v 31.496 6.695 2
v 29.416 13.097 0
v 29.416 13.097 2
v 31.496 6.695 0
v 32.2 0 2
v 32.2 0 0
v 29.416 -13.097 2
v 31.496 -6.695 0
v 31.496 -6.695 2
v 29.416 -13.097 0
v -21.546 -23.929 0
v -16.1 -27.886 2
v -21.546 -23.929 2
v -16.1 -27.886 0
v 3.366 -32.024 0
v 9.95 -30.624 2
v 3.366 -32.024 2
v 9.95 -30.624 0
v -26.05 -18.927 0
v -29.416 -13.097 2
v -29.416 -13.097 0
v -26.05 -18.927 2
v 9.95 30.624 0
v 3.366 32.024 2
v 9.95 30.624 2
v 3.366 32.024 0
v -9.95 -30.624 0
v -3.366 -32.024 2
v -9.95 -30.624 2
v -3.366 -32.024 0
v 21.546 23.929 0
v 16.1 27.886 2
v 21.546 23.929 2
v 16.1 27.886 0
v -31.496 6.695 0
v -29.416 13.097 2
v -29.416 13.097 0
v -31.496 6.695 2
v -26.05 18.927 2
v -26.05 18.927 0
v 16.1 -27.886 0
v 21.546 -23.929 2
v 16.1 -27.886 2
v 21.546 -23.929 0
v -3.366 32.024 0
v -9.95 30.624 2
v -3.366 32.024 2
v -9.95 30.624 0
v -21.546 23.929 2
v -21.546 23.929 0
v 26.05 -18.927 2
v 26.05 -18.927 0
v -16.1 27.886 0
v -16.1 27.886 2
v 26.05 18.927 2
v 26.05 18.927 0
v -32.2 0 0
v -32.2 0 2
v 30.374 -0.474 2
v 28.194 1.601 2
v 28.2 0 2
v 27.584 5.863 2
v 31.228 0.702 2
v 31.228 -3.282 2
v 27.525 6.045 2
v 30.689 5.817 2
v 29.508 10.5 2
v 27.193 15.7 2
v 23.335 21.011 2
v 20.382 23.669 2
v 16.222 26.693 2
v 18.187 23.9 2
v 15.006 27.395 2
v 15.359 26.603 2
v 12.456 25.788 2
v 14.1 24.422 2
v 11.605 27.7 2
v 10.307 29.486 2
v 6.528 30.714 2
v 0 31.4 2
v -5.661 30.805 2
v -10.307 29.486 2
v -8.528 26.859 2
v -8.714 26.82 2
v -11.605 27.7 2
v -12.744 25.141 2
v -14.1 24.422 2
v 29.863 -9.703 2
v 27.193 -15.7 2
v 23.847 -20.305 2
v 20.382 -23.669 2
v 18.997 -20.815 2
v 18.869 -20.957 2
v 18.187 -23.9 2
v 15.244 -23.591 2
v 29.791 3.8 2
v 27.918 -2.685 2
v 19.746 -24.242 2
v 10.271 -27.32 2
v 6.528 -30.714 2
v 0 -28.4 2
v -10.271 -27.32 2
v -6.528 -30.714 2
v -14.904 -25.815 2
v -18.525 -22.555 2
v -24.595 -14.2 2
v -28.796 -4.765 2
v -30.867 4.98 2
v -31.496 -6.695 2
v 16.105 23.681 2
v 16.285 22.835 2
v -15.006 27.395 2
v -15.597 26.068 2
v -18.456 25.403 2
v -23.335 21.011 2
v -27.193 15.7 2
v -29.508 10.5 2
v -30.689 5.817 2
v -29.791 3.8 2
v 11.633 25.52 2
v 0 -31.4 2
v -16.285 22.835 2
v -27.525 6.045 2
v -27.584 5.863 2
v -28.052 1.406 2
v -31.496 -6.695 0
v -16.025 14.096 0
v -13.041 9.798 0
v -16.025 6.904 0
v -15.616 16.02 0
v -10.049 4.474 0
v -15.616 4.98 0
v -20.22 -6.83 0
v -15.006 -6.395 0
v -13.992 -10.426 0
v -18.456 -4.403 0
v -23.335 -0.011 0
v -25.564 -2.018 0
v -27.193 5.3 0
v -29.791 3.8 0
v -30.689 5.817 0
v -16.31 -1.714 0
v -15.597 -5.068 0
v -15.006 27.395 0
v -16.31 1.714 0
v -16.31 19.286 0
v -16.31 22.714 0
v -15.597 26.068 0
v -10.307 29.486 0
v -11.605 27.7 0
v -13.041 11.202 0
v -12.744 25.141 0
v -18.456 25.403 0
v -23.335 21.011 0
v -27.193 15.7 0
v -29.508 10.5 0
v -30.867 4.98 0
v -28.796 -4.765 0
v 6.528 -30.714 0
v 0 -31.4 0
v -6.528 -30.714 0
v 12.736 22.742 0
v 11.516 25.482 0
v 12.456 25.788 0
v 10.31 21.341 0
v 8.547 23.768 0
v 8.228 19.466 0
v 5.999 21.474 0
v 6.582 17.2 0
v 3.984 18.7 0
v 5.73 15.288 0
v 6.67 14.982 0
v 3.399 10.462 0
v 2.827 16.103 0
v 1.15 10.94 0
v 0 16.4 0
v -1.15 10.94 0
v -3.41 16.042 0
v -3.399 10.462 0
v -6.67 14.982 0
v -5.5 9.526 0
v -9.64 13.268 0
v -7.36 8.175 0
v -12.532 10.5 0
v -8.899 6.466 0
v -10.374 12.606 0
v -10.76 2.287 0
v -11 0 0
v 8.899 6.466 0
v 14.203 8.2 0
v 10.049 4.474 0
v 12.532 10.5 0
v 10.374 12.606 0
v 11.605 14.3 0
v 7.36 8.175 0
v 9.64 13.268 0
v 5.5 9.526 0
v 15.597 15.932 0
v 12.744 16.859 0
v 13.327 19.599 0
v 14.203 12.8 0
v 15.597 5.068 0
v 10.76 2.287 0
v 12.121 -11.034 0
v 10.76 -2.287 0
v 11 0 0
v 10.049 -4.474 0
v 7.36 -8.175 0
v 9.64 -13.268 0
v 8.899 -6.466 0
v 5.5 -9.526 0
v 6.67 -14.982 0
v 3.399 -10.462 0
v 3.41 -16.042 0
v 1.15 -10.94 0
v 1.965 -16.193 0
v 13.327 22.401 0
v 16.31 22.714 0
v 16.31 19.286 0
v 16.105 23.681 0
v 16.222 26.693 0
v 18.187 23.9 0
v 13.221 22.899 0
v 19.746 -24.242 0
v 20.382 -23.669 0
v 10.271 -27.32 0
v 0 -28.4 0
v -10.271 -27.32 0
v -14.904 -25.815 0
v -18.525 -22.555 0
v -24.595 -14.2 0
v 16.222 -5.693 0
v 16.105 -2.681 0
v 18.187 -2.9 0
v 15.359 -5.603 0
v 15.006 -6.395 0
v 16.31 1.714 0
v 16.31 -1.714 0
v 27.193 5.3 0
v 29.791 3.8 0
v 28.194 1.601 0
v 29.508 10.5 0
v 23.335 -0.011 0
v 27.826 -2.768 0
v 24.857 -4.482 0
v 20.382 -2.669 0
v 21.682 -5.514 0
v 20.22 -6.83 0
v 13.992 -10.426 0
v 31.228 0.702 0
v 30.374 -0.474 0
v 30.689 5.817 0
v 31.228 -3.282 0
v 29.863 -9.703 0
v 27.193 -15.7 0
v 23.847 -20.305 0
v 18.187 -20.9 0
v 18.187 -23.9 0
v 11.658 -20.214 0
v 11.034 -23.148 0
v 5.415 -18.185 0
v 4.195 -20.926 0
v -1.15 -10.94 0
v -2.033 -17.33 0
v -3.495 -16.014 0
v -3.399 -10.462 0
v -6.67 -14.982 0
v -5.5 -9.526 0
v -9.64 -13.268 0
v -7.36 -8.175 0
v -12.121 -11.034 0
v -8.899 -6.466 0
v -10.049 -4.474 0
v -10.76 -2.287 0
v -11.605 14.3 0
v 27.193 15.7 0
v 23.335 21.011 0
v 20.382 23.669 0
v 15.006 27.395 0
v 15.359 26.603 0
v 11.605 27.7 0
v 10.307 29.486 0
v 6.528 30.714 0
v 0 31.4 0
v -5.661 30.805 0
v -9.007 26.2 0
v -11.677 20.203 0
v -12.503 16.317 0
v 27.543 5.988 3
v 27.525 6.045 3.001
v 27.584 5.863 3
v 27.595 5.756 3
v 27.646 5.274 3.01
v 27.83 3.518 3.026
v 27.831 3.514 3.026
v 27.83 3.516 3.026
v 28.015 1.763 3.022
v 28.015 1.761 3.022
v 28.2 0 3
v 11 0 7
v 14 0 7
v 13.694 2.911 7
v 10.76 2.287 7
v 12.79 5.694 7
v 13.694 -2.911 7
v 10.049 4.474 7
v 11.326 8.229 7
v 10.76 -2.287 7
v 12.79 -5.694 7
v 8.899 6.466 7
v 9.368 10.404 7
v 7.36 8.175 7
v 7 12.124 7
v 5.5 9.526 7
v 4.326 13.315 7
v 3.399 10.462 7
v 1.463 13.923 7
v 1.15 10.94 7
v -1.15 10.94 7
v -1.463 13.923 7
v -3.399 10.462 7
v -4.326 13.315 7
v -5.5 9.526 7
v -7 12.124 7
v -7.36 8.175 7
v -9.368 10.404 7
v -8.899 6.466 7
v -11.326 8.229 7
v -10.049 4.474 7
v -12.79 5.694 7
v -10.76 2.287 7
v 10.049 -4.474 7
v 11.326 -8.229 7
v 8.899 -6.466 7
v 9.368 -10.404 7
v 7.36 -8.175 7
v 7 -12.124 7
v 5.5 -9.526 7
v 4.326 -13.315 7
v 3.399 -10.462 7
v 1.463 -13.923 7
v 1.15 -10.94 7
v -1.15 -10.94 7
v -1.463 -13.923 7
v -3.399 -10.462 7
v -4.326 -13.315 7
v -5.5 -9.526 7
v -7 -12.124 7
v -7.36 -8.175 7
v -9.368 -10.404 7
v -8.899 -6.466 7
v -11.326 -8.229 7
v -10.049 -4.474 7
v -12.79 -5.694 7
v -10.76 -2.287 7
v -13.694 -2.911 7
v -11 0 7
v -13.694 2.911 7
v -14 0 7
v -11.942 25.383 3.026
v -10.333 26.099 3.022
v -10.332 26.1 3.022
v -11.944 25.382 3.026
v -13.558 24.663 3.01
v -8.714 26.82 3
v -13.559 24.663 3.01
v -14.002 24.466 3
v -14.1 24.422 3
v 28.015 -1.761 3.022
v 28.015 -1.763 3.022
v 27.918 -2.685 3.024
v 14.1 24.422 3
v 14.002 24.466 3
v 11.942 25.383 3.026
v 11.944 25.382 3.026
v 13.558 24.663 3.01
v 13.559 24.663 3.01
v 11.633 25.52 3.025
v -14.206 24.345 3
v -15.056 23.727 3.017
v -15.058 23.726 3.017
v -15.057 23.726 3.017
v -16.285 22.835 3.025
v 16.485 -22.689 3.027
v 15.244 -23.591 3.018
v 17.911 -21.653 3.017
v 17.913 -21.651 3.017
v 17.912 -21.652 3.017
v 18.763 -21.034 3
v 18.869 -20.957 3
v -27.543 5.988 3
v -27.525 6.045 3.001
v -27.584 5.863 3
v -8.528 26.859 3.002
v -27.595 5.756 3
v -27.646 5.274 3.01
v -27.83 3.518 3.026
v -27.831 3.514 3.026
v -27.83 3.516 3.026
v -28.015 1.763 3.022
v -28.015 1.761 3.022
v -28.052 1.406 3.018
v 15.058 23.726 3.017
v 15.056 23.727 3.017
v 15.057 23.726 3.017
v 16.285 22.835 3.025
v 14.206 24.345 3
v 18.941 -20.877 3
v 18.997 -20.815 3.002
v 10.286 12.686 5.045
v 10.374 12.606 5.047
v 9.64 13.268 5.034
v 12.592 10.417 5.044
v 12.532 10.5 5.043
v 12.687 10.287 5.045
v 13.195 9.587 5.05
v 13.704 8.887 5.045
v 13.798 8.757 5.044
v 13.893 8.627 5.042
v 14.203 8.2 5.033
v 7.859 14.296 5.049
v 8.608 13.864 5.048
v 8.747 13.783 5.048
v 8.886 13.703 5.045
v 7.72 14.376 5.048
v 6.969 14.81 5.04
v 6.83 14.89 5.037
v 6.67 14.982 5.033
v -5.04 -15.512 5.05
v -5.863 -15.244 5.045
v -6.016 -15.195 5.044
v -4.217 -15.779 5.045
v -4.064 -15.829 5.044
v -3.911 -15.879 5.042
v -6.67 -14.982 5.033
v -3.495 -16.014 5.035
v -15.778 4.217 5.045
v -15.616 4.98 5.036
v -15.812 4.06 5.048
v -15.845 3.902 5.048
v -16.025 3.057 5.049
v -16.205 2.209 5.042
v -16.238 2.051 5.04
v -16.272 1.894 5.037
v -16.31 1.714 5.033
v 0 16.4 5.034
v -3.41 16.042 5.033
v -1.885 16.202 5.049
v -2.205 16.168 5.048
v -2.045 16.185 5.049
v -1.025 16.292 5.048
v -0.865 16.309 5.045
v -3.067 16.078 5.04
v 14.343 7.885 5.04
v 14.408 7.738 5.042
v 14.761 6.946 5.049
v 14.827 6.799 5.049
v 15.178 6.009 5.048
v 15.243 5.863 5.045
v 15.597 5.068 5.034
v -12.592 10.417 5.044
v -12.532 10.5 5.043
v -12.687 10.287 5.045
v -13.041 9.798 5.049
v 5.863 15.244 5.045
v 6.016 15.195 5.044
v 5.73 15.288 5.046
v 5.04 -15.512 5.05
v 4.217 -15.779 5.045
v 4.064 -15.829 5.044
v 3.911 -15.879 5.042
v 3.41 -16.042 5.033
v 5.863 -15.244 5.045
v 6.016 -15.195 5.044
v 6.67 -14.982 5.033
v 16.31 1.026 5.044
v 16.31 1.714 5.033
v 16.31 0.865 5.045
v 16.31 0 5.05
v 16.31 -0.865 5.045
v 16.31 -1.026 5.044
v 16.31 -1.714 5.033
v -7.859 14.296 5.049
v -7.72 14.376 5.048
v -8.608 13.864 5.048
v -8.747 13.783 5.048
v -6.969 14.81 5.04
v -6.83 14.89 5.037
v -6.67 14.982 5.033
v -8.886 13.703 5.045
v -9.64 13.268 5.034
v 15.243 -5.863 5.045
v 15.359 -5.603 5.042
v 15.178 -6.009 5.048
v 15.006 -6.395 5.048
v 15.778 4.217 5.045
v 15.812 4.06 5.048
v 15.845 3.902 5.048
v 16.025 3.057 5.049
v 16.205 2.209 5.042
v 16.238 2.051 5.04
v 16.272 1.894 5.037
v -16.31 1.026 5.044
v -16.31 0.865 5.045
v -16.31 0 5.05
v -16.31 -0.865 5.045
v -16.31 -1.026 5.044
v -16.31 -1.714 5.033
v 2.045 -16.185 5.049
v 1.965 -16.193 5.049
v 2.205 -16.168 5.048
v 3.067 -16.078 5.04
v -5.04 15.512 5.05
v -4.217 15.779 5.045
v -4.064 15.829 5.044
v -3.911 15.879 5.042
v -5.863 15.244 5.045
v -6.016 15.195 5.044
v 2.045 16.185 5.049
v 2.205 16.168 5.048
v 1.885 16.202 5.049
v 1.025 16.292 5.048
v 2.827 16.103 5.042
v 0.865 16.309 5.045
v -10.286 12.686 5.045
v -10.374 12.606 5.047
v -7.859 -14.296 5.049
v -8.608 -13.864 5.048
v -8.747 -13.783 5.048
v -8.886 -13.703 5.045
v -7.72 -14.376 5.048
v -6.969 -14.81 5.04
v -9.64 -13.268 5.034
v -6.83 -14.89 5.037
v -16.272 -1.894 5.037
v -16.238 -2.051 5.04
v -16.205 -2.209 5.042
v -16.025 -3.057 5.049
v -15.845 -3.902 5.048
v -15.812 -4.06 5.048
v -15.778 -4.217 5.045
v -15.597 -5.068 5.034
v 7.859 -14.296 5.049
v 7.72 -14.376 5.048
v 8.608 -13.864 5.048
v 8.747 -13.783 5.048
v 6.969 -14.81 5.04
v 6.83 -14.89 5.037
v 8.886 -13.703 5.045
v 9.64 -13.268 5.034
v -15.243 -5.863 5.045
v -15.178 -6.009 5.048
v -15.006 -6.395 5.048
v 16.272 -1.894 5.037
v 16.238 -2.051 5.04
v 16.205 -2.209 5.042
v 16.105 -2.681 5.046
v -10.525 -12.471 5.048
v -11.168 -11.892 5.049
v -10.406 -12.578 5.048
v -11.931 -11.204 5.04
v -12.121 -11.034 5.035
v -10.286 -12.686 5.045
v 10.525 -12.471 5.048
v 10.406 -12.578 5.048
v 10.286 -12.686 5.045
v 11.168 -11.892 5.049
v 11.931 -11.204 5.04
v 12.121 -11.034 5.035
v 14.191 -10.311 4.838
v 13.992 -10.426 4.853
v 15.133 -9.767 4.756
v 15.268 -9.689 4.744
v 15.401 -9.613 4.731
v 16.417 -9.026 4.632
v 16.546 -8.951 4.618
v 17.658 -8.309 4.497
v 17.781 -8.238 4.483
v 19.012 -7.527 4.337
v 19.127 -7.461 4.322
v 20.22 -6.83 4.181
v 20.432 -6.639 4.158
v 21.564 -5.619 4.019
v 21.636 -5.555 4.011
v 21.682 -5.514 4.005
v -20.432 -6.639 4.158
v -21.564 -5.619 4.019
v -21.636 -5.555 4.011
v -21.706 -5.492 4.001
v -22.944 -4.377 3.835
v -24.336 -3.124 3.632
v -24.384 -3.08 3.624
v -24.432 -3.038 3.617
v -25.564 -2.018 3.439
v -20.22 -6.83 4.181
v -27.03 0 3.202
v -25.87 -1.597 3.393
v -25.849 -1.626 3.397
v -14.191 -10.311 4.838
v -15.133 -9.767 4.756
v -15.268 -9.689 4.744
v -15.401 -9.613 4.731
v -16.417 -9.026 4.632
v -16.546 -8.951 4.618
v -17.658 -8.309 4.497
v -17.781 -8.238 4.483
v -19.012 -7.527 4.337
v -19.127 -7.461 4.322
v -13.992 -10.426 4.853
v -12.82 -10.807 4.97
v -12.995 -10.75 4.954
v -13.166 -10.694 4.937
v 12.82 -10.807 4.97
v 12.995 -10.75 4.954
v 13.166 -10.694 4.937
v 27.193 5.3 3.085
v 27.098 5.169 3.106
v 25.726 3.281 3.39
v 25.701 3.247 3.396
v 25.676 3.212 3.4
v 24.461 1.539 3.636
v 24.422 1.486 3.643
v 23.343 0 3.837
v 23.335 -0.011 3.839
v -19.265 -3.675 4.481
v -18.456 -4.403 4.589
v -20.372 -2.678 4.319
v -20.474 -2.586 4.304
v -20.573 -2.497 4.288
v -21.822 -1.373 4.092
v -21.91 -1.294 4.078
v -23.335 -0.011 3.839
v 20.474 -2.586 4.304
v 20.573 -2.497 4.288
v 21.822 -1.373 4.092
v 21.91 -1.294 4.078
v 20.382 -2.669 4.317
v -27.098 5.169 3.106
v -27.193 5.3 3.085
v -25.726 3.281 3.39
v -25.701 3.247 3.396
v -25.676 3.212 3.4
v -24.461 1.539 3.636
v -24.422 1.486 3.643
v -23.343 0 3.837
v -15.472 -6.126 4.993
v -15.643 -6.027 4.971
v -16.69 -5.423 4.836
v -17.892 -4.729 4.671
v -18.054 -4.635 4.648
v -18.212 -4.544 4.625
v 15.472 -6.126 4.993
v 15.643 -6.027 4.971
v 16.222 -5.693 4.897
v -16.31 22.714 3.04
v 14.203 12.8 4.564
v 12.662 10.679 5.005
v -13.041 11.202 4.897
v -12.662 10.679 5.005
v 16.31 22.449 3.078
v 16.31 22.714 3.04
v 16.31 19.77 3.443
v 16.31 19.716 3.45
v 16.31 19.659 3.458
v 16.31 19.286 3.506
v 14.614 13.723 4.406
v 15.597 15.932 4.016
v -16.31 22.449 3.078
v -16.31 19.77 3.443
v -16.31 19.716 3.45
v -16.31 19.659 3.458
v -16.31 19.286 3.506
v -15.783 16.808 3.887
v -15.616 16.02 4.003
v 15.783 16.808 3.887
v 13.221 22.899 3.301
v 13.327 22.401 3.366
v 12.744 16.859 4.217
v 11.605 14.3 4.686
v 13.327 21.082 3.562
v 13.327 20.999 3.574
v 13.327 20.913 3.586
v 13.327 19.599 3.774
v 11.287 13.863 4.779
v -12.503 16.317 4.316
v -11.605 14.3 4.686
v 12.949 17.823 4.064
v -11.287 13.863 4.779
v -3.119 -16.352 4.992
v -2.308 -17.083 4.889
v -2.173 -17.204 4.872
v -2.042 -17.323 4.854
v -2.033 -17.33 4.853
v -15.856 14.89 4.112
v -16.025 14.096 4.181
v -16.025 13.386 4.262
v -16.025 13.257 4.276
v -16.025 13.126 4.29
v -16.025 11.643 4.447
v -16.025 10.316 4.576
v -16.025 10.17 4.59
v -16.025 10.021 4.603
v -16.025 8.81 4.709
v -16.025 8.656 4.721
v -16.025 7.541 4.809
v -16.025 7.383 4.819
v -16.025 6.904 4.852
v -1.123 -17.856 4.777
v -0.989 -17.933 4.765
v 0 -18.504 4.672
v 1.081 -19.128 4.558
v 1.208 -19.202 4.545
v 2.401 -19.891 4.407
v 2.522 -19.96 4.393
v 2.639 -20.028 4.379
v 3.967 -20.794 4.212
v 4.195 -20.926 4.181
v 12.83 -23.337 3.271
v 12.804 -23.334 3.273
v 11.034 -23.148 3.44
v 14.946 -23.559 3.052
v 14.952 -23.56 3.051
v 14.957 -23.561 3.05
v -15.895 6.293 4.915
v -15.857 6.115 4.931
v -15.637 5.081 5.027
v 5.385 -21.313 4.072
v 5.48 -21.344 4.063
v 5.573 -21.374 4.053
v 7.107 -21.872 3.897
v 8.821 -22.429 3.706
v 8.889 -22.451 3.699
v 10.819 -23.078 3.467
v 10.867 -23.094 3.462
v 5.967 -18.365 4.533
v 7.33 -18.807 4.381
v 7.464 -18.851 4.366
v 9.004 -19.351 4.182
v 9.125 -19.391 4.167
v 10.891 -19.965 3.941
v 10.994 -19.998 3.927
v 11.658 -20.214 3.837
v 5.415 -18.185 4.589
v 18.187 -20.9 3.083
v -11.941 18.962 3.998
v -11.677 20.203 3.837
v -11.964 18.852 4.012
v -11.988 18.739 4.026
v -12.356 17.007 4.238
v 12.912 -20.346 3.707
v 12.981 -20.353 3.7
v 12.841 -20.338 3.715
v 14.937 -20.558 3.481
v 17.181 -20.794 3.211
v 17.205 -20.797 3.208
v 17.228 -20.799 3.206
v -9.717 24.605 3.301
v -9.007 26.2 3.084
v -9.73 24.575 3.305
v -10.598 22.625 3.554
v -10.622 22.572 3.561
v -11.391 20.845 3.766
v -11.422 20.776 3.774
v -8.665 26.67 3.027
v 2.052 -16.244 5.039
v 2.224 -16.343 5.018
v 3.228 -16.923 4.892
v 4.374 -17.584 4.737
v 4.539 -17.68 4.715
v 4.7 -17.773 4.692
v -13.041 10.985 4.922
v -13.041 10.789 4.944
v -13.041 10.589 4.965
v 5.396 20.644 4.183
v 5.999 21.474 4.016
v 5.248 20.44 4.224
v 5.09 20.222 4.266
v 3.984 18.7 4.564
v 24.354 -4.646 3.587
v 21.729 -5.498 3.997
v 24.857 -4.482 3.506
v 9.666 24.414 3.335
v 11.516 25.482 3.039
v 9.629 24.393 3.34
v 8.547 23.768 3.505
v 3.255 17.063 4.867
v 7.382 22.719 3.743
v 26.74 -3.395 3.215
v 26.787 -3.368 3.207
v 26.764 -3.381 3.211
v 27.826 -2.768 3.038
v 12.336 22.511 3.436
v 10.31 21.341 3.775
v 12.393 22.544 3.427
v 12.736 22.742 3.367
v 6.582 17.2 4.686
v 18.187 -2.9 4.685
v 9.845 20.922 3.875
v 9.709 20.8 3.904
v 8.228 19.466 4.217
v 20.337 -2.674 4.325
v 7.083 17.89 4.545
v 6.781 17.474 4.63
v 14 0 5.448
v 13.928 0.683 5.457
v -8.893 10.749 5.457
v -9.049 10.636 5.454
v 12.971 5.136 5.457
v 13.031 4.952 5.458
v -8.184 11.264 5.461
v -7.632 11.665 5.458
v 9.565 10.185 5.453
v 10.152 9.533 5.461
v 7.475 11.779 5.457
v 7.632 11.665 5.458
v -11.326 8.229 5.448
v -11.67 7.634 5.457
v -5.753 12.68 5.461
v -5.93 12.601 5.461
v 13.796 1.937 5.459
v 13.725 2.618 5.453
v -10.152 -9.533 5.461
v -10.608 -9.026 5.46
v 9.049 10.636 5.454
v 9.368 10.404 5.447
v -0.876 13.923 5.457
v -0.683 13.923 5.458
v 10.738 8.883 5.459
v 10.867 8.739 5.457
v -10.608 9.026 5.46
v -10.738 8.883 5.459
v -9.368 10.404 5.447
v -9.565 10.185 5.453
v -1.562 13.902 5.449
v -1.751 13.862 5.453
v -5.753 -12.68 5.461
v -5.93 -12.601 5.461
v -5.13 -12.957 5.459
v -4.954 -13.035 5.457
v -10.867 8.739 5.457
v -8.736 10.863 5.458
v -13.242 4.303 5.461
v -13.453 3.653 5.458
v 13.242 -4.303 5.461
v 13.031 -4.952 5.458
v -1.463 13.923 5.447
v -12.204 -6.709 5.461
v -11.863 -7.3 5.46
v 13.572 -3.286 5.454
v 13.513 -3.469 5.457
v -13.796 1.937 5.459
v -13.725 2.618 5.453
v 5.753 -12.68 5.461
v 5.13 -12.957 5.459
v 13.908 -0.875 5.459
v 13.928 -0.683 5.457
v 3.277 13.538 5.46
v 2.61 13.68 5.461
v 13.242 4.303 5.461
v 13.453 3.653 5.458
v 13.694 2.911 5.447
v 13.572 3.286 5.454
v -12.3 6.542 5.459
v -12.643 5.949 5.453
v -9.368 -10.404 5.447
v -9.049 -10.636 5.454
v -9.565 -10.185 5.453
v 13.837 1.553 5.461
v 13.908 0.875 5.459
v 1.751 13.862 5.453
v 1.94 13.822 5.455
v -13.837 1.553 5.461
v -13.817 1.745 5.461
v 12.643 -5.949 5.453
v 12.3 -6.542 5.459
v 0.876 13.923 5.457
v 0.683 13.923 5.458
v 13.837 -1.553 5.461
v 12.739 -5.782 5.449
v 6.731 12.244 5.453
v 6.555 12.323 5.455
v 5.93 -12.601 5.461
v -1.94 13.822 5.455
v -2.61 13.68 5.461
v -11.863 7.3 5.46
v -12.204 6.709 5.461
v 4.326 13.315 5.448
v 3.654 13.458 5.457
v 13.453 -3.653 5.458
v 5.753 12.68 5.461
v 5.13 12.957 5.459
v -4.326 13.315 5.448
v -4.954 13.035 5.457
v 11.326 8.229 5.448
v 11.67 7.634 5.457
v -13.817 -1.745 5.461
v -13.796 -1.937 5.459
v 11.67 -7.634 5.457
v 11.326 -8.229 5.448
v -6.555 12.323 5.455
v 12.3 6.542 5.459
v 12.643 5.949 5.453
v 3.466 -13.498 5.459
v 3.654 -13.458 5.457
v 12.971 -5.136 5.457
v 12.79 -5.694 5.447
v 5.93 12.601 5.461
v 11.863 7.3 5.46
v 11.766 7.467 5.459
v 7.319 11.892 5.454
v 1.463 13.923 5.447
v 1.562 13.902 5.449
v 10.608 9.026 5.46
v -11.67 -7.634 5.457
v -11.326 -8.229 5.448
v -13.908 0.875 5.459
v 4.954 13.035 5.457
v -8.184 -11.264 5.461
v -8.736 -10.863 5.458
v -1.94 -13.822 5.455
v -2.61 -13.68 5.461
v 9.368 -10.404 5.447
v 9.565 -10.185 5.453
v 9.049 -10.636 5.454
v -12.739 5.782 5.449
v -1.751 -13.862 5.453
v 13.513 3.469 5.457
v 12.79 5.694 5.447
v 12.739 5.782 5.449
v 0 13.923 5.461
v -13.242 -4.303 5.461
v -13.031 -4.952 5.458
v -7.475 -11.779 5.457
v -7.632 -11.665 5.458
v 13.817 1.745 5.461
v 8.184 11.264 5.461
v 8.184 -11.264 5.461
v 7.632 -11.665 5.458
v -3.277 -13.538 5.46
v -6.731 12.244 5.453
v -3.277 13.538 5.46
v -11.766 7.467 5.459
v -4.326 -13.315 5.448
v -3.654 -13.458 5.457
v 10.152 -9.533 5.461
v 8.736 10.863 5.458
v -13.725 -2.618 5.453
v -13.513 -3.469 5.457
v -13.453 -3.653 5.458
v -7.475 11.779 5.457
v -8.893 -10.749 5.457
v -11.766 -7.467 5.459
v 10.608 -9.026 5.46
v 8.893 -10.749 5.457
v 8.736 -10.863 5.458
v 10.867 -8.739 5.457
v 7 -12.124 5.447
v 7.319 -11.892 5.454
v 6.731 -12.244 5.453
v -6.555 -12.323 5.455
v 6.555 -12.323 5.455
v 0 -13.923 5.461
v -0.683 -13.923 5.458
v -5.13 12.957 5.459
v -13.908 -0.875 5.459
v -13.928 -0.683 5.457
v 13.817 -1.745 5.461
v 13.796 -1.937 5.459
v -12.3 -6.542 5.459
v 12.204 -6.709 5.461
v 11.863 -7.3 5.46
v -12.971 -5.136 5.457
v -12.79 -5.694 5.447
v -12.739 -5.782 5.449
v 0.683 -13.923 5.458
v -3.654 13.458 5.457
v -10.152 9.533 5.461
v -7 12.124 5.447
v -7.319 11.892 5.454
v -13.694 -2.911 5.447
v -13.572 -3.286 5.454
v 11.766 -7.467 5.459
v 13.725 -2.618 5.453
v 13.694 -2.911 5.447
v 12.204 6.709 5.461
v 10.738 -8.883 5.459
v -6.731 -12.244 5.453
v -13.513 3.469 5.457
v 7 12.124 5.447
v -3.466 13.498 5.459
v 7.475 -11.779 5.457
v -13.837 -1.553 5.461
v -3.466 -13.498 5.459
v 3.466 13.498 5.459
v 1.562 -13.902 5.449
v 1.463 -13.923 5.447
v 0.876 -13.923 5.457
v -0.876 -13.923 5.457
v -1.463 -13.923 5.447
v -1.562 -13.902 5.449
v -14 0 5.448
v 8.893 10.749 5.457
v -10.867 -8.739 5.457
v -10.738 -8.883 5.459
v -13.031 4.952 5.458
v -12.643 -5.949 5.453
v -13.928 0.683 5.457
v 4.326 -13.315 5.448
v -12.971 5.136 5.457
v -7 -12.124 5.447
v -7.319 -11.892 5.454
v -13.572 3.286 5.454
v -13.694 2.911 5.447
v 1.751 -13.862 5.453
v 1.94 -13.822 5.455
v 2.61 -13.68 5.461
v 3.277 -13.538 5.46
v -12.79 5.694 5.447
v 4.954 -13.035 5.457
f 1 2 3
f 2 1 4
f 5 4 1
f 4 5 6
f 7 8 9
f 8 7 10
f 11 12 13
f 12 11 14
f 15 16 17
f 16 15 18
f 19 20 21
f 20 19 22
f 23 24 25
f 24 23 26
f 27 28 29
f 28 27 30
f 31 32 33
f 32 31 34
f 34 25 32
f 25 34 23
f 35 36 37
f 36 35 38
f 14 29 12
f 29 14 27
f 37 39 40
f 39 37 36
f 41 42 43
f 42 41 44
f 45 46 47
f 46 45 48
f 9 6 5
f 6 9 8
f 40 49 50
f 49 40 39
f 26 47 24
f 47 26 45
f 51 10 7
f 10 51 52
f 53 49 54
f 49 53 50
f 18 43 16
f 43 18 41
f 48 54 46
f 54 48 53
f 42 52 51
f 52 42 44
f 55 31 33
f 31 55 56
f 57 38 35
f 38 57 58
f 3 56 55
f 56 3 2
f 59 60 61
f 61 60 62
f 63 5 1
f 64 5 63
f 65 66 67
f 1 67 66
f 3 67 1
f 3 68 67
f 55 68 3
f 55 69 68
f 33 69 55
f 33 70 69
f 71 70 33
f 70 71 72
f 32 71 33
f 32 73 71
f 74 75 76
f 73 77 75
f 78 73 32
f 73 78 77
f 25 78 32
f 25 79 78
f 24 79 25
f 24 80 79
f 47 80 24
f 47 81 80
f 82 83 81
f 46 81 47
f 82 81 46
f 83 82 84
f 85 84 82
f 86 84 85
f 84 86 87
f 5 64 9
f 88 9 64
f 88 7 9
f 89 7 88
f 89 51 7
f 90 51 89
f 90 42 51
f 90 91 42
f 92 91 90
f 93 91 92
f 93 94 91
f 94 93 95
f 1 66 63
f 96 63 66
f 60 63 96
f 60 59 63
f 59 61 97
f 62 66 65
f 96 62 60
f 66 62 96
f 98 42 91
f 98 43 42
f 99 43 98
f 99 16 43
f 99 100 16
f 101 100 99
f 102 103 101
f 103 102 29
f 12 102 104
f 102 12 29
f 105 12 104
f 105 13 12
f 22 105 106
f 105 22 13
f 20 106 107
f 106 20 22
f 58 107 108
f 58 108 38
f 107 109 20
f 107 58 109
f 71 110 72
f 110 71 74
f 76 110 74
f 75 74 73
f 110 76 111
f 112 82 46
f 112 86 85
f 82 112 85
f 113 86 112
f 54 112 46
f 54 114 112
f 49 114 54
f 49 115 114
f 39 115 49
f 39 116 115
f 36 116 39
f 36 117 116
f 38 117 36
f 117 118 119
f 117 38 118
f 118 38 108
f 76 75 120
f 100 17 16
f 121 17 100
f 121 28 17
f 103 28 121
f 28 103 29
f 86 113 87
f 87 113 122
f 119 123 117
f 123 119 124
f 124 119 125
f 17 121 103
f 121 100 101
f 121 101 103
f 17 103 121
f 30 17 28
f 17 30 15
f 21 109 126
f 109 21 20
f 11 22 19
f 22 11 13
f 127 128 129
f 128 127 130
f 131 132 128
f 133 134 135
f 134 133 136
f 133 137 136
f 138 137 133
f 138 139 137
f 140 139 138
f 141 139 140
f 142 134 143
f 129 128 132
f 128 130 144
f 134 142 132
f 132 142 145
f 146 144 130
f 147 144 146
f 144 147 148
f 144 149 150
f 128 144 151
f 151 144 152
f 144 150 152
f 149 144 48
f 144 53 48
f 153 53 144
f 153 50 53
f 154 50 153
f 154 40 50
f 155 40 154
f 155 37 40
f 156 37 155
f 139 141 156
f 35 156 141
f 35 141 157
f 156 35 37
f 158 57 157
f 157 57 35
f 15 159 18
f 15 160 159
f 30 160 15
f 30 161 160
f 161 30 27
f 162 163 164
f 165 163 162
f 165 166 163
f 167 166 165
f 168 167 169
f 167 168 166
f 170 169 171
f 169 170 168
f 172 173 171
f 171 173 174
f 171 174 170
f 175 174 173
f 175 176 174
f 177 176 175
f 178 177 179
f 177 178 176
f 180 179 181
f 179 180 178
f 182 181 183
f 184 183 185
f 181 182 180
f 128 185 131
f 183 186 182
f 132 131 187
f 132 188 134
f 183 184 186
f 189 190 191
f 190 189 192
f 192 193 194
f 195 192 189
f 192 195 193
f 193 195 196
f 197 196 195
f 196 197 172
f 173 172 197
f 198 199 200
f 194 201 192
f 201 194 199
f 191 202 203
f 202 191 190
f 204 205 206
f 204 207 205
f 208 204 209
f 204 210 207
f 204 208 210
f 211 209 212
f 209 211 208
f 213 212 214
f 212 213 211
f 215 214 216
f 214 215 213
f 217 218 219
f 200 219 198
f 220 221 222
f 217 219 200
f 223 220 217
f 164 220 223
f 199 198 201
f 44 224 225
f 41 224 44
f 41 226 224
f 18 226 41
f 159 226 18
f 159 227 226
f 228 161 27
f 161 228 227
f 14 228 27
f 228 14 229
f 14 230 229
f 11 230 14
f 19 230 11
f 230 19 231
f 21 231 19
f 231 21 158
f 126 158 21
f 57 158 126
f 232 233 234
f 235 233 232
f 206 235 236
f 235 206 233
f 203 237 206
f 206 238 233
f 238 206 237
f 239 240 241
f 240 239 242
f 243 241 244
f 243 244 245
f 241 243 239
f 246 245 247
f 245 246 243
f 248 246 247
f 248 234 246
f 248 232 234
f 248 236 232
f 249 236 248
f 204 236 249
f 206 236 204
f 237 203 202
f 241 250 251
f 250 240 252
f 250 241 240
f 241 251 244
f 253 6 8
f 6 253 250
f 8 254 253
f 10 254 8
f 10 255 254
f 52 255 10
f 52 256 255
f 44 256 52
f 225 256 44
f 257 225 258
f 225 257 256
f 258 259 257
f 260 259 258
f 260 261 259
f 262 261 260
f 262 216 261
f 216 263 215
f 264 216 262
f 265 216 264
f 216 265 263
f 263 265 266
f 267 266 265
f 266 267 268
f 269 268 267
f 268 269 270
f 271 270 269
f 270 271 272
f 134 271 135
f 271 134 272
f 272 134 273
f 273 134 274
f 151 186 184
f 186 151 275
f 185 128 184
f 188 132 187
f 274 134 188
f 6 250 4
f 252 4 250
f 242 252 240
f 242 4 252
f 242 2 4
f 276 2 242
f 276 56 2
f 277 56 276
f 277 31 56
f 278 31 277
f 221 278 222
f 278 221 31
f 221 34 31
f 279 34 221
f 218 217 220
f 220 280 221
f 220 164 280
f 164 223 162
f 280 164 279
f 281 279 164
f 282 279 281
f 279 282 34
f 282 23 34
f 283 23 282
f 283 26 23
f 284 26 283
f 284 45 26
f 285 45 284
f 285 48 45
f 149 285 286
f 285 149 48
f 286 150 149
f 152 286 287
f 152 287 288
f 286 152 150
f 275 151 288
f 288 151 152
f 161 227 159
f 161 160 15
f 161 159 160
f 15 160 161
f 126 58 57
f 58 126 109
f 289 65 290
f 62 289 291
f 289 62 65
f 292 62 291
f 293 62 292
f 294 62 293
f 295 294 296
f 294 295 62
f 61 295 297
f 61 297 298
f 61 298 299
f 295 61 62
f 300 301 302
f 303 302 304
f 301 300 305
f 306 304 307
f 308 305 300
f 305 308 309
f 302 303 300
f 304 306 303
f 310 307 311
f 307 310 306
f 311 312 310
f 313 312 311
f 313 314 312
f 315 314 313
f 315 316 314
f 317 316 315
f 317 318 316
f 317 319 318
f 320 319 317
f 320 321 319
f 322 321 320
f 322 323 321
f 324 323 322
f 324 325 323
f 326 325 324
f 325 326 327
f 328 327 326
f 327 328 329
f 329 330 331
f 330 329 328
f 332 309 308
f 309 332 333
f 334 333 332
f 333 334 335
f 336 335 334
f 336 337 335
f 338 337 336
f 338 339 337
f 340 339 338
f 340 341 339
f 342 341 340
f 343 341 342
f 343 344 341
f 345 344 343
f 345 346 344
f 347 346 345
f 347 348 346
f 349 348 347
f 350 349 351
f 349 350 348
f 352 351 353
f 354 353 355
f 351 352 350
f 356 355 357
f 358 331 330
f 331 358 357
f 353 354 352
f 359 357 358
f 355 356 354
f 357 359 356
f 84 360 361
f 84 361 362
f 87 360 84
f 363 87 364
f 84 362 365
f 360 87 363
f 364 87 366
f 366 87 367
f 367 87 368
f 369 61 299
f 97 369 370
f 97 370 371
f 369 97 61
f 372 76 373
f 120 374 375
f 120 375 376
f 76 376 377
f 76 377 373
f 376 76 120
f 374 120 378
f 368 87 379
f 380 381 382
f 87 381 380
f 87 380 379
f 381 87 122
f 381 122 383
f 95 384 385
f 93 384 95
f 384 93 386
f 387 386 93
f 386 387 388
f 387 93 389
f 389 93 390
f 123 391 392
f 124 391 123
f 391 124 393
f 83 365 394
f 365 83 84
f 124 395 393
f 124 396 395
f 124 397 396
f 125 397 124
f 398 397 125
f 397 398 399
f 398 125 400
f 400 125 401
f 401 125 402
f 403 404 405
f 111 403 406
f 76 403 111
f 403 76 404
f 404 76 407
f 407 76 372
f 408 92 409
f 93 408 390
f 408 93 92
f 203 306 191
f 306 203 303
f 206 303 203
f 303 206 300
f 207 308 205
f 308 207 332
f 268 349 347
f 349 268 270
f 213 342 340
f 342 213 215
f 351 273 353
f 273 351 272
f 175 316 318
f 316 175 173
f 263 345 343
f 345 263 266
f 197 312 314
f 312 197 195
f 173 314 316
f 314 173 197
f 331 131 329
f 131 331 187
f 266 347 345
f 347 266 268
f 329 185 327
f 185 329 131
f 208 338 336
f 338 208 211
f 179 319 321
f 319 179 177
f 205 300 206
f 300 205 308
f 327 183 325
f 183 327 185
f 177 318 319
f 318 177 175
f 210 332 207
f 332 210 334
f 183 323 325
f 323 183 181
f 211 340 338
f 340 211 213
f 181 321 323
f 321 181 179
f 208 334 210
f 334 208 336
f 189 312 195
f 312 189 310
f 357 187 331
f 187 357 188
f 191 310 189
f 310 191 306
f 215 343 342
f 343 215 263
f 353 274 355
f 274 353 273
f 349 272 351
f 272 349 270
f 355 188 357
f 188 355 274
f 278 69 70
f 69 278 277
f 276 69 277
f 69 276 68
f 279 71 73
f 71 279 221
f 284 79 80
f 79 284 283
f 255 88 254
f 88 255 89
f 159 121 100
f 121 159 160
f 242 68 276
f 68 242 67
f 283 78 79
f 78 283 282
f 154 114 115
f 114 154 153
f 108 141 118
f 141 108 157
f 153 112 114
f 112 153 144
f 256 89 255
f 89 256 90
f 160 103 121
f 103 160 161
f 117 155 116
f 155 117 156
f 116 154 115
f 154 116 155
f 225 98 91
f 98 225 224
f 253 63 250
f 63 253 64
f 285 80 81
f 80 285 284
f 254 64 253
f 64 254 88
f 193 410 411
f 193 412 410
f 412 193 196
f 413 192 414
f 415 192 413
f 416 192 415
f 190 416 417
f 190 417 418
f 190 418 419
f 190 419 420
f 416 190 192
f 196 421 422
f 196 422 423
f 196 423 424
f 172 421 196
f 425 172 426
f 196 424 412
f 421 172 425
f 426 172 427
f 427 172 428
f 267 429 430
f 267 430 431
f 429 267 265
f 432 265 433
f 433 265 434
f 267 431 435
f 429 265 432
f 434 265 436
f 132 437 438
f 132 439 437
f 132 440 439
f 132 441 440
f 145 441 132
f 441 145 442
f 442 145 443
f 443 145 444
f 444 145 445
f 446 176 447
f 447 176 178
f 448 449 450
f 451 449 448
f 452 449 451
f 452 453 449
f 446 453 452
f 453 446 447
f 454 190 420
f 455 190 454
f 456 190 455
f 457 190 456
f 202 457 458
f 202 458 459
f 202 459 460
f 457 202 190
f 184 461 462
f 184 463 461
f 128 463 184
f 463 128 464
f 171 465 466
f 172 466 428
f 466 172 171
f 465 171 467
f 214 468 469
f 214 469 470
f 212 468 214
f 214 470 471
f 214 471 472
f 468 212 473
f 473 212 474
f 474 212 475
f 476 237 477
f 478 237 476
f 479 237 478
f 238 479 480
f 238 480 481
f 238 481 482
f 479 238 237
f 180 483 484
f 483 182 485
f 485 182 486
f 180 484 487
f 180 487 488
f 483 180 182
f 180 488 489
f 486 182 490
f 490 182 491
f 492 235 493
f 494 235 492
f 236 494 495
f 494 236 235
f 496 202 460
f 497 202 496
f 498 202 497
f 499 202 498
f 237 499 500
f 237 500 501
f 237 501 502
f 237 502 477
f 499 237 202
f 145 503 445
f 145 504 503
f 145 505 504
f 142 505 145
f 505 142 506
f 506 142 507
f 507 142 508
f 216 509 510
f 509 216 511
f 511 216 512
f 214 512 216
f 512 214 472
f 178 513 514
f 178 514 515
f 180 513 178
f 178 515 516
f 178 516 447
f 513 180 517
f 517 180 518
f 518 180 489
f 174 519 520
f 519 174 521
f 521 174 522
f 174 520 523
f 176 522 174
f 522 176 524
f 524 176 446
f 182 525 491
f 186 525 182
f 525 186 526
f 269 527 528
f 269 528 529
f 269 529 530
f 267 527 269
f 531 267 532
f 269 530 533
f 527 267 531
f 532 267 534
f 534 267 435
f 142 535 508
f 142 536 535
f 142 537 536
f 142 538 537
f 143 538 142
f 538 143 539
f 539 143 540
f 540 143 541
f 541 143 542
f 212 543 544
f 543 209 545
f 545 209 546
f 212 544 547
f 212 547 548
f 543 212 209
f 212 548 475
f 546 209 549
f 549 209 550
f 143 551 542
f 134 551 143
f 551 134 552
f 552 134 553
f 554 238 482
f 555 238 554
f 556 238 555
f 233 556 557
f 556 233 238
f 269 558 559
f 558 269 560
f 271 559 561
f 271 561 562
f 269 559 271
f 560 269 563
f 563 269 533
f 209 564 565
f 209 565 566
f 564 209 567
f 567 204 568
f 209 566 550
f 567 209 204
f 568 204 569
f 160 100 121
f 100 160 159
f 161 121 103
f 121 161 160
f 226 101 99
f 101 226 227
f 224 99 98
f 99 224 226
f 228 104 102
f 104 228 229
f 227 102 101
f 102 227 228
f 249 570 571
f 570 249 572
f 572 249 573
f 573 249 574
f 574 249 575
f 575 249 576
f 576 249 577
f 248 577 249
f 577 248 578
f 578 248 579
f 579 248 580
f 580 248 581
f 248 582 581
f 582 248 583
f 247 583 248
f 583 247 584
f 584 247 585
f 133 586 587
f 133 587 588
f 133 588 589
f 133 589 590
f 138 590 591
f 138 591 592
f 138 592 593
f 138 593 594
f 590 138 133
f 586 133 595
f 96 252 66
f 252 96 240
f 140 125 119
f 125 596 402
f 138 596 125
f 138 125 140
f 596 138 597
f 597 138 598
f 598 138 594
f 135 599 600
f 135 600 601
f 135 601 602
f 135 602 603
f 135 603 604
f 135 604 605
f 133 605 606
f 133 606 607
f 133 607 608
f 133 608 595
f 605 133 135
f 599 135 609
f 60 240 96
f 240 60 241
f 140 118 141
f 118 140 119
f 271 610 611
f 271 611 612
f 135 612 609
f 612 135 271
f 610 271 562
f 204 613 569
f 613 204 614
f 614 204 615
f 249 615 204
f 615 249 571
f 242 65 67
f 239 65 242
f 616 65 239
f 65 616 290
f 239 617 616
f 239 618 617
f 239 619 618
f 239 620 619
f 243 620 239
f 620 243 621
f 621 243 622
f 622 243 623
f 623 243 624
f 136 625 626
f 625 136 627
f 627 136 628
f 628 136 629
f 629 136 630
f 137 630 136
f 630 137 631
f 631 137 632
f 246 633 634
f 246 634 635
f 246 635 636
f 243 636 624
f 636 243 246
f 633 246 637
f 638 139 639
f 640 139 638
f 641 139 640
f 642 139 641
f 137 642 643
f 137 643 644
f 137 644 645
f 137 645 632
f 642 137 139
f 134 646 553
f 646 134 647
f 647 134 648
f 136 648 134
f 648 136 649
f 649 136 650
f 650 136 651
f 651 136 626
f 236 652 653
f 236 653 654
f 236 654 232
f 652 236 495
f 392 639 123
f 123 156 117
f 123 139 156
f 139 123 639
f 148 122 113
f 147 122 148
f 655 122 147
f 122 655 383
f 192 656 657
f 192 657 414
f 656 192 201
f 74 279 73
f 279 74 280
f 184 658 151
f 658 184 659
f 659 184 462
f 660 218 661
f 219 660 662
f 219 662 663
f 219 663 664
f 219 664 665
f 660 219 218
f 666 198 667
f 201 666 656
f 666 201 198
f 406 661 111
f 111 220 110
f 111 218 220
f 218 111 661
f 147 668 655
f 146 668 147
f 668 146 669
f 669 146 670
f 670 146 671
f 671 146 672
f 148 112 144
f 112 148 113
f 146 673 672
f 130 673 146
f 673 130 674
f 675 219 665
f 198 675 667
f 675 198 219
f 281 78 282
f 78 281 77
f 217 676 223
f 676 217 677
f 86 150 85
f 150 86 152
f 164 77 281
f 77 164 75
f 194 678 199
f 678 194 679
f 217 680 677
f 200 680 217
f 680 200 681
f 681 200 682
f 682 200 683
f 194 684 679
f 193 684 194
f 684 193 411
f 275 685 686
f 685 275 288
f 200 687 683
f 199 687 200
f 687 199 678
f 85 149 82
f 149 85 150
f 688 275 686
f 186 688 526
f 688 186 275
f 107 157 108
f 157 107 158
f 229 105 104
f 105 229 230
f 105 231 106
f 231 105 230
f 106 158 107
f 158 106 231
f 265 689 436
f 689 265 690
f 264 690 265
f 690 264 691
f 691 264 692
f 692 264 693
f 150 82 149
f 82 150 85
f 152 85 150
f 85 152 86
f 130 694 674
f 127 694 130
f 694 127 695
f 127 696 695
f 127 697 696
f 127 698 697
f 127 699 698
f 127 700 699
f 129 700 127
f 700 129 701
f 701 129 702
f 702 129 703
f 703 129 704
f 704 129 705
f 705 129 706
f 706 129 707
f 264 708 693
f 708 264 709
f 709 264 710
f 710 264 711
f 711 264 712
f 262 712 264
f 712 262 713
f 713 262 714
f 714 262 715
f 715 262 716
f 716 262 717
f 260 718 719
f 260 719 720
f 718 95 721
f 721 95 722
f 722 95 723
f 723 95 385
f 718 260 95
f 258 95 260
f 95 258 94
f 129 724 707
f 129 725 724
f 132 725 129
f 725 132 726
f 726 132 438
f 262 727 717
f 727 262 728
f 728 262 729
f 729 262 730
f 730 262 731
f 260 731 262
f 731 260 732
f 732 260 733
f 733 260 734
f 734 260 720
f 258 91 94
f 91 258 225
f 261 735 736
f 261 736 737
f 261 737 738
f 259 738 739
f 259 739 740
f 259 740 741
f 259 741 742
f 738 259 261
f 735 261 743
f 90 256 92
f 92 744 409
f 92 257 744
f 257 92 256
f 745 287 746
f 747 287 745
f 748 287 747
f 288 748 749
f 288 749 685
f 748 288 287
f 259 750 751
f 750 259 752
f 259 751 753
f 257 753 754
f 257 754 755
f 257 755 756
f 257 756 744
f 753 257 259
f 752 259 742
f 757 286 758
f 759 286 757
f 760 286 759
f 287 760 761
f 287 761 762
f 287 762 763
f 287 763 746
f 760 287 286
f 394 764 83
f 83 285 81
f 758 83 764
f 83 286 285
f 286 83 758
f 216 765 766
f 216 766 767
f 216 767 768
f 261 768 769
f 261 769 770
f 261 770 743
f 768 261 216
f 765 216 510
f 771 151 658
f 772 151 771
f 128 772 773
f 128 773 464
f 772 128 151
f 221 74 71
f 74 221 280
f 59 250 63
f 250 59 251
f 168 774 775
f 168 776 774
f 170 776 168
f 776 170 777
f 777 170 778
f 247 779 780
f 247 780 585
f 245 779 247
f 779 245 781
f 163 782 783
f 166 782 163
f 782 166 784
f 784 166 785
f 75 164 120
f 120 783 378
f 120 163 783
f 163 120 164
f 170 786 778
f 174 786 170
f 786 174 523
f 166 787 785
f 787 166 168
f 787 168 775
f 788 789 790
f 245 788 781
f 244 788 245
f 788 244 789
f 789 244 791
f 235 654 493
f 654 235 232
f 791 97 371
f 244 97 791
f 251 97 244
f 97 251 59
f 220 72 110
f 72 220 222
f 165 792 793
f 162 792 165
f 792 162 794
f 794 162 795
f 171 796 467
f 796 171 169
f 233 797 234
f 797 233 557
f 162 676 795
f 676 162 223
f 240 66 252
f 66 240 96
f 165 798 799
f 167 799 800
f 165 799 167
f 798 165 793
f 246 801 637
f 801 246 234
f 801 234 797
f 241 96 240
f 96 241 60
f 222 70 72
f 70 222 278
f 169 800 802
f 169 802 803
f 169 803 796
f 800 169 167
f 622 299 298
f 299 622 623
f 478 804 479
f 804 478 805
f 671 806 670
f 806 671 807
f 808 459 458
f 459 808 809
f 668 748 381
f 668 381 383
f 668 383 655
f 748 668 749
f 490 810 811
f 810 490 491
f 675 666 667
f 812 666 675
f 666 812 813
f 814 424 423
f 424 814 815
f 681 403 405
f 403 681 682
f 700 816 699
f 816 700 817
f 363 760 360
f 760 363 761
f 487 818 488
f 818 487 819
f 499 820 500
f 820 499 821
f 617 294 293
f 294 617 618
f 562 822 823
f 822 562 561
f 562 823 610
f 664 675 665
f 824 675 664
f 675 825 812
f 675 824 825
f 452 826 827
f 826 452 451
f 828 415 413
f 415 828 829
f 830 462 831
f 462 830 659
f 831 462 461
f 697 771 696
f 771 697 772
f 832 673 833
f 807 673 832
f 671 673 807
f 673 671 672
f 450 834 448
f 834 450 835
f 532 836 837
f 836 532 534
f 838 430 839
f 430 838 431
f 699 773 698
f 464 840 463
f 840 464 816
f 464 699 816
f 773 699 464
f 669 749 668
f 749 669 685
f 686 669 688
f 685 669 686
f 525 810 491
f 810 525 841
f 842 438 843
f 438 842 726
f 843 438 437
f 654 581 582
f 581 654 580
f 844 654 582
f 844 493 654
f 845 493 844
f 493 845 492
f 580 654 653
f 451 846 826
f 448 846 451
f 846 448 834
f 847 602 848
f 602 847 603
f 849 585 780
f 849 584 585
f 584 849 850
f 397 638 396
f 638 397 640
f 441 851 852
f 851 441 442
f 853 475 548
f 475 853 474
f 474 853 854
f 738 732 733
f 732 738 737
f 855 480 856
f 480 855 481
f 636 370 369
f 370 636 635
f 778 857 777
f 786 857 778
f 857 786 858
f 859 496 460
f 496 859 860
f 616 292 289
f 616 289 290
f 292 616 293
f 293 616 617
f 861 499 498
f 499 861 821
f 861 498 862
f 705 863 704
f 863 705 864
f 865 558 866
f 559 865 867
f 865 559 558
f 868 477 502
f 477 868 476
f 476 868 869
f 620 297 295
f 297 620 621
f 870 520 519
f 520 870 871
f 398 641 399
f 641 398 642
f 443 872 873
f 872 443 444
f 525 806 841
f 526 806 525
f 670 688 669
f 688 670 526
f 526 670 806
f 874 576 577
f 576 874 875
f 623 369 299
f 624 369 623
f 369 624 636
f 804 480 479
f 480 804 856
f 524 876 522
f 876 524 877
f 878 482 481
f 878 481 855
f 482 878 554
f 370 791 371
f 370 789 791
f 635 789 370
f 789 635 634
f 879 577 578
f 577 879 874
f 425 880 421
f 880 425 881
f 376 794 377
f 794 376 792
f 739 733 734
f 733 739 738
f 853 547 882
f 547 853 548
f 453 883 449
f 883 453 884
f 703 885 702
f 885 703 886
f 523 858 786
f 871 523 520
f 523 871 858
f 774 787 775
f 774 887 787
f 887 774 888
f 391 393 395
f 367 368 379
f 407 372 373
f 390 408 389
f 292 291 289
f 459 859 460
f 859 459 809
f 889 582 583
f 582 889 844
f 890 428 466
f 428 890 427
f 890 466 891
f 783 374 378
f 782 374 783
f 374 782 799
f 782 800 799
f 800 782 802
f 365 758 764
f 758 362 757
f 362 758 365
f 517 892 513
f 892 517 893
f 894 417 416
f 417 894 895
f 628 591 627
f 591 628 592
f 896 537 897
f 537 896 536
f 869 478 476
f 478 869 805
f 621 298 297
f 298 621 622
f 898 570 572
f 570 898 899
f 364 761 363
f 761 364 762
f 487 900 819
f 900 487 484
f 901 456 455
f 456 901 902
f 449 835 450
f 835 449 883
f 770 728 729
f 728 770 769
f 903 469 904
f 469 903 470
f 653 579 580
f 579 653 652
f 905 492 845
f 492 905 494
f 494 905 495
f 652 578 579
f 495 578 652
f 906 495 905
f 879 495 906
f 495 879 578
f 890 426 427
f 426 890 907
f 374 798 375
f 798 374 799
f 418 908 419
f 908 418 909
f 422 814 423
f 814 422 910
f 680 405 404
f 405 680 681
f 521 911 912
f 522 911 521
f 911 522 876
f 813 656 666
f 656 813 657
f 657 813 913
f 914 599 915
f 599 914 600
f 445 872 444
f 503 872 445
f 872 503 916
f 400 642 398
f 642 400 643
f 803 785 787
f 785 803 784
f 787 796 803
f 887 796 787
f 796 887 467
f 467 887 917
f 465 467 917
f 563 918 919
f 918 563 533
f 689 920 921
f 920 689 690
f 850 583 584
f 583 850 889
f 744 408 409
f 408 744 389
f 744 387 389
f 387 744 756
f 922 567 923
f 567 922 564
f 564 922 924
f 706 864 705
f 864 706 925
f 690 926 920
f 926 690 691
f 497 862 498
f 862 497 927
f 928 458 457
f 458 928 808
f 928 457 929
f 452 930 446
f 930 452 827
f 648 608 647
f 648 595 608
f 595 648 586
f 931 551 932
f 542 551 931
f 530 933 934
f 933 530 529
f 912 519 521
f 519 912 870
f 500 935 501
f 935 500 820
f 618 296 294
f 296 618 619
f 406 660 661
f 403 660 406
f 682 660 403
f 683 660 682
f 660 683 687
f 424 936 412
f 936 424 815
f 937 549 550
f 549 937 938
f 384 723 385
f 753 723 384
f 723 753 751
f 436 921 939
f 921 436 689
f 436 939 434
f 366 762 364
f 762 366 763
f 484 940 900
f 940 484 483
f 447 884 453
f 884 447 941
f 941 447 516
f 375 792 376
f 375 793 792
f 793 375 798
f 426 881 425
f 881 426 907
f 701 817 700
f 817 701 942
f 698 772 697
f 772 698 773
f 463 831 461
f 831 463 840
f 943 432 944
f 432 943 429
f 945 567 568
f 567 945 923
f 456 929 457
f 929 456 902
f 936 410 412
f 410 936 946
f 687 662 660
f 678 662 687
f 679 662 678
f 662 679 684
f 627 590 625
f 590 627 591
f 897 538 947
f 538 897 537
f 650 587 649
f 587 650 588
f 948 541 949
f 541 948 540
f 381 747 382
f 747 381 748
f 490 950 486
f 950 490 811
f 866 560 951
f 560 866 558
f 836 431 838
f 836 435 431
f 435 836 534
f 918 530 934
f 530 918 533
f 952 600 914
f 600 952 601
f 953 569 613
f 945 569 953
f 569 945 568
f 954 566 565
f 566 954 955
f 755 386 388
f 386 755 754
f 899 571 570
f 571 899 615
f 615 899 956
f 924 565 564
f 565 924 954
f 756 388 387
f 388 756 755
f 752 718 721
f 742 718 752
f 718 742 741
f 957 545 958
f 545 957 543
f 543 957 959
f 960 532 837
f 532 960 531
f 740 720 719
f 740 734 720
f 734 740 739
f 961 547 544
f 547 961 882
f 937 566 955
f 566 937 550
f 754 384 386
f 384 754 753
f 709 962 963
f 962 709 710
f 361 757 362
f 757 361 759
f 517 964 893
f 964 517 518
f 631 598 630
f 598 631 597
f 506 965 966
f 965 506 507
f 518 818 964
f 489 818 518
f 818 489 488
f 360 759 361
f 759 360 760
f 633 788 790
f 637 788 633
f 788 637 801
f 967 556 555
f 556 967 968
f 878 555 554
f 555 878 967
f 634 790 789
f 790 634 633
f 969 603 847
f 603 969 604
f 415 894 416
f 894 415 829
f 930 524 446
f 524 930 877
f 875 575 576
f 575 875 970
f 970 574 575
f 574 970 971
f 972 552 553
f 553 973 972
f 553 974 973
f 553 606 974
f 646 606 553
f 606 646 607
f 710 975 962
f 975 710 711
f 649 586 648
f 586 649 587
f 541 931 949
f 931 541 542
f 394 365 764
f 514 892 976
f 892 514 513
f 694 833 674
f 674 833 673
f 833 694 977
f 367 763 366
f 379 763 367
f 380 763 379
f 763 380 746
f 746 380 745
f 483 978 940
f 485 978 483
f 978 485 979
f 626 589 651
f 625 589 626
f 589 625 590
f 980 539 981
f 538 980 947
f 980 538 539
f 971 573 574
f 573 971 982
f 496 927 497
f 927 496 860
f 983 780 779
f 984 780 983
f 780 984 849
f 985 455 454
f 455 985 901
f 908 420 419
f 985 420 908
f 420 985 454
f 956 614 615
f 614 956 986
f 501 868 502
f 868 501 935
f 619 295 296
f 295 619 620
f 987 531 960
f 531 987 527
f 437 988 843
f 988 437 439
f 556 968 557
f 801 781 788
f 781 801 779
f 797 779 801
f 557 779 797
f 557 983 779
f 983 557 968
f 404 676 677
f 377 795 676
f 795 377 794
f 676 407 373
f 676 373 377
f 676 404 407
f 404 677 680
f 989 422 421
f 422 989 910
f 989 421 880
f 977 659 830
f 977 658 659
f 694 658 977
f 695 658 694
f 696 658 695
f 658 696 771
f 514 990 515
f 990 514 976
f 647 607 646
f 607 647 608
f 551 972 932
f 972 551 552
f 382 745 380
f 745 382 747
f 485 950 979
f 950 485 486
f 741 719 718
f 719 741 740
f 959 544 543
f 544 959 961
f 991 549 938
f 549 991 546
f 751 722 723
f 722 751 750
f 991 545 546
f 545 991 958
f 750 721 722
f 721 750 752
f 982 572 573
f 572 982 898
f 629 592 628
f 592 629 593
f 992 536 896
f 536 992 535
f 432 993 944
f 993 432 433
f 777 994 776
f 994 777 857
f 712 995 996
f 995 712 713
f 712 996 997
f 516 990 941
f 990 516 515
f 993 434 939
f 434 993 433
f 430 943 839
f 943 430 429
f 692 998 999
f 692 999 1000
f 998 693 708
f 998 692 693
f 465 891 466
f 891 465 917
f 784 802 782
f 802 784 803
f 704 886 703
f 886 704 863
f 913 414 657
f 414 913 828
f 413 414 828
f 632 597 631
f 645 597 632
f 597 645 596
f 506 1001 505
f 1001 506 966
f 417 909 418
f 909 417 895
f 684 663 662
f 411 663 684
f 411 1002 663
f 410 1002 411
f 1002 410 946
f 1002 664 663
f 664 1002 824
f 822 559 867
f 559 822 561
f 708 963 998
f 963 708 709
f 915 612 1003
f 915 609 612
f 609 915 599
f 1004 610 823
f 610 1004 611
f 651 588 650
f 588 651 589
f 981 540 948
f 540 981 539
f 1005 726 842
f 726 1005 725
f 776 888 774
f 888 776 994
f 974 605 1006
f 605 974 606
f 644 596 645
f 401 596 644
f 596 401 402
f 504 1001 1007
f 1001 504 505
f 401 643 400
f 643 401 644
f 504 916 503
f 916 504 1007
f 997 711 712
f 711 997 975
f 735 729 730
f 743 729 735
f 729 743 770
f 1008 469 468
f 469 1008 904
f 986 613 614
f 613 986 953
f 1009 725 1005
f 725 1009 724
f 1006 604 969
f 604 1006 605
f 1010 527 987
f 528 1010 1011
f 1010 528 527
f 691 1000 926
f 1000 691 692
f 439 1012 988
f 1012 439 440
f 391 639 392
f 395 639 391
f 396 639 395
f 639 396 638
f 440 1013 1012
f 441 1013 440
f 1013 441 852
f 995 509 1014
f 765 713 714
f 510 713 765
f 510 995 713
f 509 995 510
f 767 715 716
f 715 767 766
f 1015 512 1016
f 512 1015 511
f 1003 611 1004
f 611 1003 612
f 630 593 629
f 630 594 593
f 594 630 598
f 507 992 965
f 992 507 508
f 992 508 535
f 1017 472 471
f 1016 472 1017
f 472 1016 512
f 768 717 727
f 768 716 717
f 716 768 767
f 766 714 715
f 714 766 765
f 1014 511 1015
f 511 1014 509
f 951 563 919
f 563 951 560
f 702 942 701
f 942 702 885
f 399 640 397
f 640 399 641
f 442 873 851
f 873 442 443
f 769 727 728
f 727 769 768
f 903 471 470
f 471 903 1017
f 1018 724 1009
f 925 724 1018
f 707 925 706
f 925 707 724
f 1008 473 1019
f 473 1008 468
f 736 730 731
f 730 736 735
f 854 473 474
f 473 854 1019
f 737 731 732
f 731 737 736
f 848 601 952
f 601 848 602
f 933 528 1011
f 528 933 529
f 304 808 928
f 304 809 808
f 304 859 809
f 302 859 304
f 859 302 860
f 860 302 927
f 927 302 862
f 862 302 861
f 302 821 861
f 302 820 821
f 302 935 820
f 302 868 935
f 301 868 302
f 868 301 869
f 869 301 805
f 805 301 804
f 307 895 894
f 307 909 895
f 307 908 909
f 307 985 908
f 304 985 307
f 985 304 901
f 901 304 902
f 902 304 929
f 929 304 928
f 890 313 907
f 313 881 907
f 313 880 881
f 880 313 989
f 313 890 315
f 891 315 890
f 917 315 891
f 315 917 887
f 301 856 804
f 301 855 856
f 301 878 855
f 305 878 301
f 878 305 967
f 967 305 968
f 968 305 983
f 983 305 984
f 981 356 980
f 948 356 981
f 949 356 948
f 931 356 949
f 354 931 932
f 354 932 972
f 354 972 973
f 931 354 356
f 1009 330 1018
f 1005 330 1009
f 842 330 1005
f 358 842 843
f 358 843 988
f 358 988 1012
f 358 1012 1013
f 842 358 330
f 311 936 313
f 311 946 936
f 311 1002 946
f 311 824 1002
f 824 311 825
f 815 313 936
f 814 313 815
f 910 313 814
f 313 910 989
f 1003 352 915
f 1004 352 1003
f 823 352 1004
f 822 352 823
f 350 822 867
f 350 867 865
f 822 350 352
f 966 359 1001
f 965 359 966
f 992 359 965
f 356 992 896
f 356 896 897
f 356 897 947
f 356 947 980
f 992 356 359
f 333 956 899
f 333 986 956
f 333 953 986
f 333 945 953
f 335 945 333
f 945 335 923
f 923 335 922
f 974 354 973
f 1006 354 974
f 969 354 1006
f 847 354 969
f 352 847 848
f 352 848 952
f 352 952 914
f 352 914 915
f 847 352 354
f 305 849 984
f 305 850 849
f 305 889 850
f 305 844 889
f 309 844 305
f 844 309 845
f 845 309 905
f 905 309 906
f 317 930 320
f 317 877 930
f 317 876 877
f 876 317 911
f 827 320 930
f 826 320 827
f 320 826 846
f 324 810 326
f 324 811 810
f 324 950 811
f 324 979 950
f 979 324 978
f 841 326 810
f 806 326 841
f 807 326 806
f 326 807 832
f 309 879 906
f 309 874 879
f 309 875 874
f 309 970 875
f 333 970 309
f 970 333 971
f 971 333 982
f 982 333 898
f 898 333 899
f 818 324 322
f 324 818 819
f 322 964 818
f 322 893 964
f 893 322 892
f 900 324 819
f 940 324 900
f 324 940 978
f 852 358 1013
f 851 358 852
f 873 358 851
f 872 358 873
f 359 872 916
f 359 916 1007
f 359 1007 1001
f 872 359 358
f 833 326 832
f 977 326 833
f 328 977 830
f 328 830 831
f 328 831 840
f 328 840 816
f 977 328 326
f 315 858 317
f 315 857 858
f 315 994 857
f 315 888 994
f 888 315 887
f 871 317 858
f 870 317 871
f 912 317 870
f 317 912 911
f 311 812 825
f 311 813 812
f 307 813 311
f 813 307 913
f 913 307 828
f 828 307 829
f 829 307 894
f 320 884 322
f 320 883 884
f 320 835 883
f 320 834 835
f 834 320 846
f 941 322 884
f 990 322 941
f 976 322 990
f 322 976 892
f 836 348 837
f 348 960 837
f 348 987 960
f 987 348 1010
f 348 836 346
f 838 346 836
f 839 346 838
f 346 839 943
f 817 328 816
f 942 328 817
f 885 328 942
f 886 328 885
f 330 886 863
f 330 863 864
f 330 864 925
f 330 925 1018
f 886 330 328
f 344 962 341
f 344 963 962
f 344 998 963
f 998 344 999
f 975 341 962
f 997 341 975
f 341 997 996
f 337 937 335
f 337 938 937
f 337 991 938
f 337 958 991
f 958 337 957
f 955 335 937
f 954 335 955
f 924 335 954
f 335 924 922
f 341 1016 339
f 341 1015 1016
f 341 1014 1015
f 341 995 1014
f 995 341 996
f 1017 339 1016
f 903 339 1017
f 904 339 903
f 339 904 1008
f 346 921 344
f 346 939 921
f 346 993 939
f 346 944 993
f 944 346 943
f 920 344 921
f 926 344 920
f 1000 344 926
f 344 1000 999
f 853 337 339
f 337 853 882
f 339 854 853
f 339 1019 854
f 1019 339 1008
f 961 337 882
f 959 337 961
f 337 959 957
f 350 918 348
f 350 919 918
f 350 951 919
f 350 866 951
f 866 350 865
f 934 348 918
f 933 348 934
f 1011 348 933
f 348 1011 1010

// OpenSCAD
// file: decorative/moire.scad
module concentrics(r, tbar, tgap, z) {
  for (i = [0:(tbar+tgap):r]) {
      difference() {
	cylinder(r=r-i, h=z);
	translate([0,0,-1])
	  cylinder(r=r-i-tbar, h=z+2);
      }
    }
}


module moire(r, tbar, tgap, z, s) {
  concentrics(r, tbar, tgap, z);
  translate([s,0,0])
    concentrics(r, tbar, tgap, z);
}

module trimoire(r, tbar, tgap, z, s) {
  concentrics(r, tbar, tgap, z);
  translate([s*cos(60),s*sin(60),0])
    concentrics(r, tbar, tgap, z);
  translate([s,0,0])
    concentrics(r, tbar, tgap, z);
}



module pentmoire(r, tbar, tgap, z, s) {

  for (i = [0:72:359]) {
    rotate([0,0,i])
      translate([s,0,0])
      concentrics(r, tbar, tgap, z);
  }
}



translate([50, 50, 0]) concentrics(20, 1,2, 3);

pentmoire(38, 0.4, 3, 3, 2);
// main file
use <decorative/moire.scad>;

spool_id = 56.4; // 53 for Peak Green, 37.5 for Monoprice
flange_size = 4;
/*
intersection() {

  difference() {
    union() {
      cylinder(h=2, r=(spool_id+2*flange_size)/2);
      cylinder(h=7, r=spool_id/2);

    }

    translate([0,0,-1])
      cylinder(h=20, r=22/2, $fn=30);
  }

  union() {
    cylinder(h=13, r=28/2);

    for (i = [0,120,240]) {
      rotate([0,0,i])
	translate([-15,-3,0])
	cube([20,100,50]);
    }
  }
}
*/

intersection() {

  difference() {
    union() {
      cylinder(h=2, r=(spool_id+2*flange_size)/2);
      cylinder(h=7, r=spool_id/2);

    }

    translate([0,0,-1])
      cylinder(h=20, r=22/2, $fn=30);
  }

  union() {
    cylinder(h=13, r=28/2);

intersection() {
rotate([0,0,30]) trimoire(spool_id+flange_size-8, 3, 15, 20, 21);
union() {
translate([0,0,3]) cylinder(r2=5, r1=spool_id/2, h=7-3, $fn=100);
cylinder(r=spool_id/2+flange_size, h=3);
}
}


  }
}
